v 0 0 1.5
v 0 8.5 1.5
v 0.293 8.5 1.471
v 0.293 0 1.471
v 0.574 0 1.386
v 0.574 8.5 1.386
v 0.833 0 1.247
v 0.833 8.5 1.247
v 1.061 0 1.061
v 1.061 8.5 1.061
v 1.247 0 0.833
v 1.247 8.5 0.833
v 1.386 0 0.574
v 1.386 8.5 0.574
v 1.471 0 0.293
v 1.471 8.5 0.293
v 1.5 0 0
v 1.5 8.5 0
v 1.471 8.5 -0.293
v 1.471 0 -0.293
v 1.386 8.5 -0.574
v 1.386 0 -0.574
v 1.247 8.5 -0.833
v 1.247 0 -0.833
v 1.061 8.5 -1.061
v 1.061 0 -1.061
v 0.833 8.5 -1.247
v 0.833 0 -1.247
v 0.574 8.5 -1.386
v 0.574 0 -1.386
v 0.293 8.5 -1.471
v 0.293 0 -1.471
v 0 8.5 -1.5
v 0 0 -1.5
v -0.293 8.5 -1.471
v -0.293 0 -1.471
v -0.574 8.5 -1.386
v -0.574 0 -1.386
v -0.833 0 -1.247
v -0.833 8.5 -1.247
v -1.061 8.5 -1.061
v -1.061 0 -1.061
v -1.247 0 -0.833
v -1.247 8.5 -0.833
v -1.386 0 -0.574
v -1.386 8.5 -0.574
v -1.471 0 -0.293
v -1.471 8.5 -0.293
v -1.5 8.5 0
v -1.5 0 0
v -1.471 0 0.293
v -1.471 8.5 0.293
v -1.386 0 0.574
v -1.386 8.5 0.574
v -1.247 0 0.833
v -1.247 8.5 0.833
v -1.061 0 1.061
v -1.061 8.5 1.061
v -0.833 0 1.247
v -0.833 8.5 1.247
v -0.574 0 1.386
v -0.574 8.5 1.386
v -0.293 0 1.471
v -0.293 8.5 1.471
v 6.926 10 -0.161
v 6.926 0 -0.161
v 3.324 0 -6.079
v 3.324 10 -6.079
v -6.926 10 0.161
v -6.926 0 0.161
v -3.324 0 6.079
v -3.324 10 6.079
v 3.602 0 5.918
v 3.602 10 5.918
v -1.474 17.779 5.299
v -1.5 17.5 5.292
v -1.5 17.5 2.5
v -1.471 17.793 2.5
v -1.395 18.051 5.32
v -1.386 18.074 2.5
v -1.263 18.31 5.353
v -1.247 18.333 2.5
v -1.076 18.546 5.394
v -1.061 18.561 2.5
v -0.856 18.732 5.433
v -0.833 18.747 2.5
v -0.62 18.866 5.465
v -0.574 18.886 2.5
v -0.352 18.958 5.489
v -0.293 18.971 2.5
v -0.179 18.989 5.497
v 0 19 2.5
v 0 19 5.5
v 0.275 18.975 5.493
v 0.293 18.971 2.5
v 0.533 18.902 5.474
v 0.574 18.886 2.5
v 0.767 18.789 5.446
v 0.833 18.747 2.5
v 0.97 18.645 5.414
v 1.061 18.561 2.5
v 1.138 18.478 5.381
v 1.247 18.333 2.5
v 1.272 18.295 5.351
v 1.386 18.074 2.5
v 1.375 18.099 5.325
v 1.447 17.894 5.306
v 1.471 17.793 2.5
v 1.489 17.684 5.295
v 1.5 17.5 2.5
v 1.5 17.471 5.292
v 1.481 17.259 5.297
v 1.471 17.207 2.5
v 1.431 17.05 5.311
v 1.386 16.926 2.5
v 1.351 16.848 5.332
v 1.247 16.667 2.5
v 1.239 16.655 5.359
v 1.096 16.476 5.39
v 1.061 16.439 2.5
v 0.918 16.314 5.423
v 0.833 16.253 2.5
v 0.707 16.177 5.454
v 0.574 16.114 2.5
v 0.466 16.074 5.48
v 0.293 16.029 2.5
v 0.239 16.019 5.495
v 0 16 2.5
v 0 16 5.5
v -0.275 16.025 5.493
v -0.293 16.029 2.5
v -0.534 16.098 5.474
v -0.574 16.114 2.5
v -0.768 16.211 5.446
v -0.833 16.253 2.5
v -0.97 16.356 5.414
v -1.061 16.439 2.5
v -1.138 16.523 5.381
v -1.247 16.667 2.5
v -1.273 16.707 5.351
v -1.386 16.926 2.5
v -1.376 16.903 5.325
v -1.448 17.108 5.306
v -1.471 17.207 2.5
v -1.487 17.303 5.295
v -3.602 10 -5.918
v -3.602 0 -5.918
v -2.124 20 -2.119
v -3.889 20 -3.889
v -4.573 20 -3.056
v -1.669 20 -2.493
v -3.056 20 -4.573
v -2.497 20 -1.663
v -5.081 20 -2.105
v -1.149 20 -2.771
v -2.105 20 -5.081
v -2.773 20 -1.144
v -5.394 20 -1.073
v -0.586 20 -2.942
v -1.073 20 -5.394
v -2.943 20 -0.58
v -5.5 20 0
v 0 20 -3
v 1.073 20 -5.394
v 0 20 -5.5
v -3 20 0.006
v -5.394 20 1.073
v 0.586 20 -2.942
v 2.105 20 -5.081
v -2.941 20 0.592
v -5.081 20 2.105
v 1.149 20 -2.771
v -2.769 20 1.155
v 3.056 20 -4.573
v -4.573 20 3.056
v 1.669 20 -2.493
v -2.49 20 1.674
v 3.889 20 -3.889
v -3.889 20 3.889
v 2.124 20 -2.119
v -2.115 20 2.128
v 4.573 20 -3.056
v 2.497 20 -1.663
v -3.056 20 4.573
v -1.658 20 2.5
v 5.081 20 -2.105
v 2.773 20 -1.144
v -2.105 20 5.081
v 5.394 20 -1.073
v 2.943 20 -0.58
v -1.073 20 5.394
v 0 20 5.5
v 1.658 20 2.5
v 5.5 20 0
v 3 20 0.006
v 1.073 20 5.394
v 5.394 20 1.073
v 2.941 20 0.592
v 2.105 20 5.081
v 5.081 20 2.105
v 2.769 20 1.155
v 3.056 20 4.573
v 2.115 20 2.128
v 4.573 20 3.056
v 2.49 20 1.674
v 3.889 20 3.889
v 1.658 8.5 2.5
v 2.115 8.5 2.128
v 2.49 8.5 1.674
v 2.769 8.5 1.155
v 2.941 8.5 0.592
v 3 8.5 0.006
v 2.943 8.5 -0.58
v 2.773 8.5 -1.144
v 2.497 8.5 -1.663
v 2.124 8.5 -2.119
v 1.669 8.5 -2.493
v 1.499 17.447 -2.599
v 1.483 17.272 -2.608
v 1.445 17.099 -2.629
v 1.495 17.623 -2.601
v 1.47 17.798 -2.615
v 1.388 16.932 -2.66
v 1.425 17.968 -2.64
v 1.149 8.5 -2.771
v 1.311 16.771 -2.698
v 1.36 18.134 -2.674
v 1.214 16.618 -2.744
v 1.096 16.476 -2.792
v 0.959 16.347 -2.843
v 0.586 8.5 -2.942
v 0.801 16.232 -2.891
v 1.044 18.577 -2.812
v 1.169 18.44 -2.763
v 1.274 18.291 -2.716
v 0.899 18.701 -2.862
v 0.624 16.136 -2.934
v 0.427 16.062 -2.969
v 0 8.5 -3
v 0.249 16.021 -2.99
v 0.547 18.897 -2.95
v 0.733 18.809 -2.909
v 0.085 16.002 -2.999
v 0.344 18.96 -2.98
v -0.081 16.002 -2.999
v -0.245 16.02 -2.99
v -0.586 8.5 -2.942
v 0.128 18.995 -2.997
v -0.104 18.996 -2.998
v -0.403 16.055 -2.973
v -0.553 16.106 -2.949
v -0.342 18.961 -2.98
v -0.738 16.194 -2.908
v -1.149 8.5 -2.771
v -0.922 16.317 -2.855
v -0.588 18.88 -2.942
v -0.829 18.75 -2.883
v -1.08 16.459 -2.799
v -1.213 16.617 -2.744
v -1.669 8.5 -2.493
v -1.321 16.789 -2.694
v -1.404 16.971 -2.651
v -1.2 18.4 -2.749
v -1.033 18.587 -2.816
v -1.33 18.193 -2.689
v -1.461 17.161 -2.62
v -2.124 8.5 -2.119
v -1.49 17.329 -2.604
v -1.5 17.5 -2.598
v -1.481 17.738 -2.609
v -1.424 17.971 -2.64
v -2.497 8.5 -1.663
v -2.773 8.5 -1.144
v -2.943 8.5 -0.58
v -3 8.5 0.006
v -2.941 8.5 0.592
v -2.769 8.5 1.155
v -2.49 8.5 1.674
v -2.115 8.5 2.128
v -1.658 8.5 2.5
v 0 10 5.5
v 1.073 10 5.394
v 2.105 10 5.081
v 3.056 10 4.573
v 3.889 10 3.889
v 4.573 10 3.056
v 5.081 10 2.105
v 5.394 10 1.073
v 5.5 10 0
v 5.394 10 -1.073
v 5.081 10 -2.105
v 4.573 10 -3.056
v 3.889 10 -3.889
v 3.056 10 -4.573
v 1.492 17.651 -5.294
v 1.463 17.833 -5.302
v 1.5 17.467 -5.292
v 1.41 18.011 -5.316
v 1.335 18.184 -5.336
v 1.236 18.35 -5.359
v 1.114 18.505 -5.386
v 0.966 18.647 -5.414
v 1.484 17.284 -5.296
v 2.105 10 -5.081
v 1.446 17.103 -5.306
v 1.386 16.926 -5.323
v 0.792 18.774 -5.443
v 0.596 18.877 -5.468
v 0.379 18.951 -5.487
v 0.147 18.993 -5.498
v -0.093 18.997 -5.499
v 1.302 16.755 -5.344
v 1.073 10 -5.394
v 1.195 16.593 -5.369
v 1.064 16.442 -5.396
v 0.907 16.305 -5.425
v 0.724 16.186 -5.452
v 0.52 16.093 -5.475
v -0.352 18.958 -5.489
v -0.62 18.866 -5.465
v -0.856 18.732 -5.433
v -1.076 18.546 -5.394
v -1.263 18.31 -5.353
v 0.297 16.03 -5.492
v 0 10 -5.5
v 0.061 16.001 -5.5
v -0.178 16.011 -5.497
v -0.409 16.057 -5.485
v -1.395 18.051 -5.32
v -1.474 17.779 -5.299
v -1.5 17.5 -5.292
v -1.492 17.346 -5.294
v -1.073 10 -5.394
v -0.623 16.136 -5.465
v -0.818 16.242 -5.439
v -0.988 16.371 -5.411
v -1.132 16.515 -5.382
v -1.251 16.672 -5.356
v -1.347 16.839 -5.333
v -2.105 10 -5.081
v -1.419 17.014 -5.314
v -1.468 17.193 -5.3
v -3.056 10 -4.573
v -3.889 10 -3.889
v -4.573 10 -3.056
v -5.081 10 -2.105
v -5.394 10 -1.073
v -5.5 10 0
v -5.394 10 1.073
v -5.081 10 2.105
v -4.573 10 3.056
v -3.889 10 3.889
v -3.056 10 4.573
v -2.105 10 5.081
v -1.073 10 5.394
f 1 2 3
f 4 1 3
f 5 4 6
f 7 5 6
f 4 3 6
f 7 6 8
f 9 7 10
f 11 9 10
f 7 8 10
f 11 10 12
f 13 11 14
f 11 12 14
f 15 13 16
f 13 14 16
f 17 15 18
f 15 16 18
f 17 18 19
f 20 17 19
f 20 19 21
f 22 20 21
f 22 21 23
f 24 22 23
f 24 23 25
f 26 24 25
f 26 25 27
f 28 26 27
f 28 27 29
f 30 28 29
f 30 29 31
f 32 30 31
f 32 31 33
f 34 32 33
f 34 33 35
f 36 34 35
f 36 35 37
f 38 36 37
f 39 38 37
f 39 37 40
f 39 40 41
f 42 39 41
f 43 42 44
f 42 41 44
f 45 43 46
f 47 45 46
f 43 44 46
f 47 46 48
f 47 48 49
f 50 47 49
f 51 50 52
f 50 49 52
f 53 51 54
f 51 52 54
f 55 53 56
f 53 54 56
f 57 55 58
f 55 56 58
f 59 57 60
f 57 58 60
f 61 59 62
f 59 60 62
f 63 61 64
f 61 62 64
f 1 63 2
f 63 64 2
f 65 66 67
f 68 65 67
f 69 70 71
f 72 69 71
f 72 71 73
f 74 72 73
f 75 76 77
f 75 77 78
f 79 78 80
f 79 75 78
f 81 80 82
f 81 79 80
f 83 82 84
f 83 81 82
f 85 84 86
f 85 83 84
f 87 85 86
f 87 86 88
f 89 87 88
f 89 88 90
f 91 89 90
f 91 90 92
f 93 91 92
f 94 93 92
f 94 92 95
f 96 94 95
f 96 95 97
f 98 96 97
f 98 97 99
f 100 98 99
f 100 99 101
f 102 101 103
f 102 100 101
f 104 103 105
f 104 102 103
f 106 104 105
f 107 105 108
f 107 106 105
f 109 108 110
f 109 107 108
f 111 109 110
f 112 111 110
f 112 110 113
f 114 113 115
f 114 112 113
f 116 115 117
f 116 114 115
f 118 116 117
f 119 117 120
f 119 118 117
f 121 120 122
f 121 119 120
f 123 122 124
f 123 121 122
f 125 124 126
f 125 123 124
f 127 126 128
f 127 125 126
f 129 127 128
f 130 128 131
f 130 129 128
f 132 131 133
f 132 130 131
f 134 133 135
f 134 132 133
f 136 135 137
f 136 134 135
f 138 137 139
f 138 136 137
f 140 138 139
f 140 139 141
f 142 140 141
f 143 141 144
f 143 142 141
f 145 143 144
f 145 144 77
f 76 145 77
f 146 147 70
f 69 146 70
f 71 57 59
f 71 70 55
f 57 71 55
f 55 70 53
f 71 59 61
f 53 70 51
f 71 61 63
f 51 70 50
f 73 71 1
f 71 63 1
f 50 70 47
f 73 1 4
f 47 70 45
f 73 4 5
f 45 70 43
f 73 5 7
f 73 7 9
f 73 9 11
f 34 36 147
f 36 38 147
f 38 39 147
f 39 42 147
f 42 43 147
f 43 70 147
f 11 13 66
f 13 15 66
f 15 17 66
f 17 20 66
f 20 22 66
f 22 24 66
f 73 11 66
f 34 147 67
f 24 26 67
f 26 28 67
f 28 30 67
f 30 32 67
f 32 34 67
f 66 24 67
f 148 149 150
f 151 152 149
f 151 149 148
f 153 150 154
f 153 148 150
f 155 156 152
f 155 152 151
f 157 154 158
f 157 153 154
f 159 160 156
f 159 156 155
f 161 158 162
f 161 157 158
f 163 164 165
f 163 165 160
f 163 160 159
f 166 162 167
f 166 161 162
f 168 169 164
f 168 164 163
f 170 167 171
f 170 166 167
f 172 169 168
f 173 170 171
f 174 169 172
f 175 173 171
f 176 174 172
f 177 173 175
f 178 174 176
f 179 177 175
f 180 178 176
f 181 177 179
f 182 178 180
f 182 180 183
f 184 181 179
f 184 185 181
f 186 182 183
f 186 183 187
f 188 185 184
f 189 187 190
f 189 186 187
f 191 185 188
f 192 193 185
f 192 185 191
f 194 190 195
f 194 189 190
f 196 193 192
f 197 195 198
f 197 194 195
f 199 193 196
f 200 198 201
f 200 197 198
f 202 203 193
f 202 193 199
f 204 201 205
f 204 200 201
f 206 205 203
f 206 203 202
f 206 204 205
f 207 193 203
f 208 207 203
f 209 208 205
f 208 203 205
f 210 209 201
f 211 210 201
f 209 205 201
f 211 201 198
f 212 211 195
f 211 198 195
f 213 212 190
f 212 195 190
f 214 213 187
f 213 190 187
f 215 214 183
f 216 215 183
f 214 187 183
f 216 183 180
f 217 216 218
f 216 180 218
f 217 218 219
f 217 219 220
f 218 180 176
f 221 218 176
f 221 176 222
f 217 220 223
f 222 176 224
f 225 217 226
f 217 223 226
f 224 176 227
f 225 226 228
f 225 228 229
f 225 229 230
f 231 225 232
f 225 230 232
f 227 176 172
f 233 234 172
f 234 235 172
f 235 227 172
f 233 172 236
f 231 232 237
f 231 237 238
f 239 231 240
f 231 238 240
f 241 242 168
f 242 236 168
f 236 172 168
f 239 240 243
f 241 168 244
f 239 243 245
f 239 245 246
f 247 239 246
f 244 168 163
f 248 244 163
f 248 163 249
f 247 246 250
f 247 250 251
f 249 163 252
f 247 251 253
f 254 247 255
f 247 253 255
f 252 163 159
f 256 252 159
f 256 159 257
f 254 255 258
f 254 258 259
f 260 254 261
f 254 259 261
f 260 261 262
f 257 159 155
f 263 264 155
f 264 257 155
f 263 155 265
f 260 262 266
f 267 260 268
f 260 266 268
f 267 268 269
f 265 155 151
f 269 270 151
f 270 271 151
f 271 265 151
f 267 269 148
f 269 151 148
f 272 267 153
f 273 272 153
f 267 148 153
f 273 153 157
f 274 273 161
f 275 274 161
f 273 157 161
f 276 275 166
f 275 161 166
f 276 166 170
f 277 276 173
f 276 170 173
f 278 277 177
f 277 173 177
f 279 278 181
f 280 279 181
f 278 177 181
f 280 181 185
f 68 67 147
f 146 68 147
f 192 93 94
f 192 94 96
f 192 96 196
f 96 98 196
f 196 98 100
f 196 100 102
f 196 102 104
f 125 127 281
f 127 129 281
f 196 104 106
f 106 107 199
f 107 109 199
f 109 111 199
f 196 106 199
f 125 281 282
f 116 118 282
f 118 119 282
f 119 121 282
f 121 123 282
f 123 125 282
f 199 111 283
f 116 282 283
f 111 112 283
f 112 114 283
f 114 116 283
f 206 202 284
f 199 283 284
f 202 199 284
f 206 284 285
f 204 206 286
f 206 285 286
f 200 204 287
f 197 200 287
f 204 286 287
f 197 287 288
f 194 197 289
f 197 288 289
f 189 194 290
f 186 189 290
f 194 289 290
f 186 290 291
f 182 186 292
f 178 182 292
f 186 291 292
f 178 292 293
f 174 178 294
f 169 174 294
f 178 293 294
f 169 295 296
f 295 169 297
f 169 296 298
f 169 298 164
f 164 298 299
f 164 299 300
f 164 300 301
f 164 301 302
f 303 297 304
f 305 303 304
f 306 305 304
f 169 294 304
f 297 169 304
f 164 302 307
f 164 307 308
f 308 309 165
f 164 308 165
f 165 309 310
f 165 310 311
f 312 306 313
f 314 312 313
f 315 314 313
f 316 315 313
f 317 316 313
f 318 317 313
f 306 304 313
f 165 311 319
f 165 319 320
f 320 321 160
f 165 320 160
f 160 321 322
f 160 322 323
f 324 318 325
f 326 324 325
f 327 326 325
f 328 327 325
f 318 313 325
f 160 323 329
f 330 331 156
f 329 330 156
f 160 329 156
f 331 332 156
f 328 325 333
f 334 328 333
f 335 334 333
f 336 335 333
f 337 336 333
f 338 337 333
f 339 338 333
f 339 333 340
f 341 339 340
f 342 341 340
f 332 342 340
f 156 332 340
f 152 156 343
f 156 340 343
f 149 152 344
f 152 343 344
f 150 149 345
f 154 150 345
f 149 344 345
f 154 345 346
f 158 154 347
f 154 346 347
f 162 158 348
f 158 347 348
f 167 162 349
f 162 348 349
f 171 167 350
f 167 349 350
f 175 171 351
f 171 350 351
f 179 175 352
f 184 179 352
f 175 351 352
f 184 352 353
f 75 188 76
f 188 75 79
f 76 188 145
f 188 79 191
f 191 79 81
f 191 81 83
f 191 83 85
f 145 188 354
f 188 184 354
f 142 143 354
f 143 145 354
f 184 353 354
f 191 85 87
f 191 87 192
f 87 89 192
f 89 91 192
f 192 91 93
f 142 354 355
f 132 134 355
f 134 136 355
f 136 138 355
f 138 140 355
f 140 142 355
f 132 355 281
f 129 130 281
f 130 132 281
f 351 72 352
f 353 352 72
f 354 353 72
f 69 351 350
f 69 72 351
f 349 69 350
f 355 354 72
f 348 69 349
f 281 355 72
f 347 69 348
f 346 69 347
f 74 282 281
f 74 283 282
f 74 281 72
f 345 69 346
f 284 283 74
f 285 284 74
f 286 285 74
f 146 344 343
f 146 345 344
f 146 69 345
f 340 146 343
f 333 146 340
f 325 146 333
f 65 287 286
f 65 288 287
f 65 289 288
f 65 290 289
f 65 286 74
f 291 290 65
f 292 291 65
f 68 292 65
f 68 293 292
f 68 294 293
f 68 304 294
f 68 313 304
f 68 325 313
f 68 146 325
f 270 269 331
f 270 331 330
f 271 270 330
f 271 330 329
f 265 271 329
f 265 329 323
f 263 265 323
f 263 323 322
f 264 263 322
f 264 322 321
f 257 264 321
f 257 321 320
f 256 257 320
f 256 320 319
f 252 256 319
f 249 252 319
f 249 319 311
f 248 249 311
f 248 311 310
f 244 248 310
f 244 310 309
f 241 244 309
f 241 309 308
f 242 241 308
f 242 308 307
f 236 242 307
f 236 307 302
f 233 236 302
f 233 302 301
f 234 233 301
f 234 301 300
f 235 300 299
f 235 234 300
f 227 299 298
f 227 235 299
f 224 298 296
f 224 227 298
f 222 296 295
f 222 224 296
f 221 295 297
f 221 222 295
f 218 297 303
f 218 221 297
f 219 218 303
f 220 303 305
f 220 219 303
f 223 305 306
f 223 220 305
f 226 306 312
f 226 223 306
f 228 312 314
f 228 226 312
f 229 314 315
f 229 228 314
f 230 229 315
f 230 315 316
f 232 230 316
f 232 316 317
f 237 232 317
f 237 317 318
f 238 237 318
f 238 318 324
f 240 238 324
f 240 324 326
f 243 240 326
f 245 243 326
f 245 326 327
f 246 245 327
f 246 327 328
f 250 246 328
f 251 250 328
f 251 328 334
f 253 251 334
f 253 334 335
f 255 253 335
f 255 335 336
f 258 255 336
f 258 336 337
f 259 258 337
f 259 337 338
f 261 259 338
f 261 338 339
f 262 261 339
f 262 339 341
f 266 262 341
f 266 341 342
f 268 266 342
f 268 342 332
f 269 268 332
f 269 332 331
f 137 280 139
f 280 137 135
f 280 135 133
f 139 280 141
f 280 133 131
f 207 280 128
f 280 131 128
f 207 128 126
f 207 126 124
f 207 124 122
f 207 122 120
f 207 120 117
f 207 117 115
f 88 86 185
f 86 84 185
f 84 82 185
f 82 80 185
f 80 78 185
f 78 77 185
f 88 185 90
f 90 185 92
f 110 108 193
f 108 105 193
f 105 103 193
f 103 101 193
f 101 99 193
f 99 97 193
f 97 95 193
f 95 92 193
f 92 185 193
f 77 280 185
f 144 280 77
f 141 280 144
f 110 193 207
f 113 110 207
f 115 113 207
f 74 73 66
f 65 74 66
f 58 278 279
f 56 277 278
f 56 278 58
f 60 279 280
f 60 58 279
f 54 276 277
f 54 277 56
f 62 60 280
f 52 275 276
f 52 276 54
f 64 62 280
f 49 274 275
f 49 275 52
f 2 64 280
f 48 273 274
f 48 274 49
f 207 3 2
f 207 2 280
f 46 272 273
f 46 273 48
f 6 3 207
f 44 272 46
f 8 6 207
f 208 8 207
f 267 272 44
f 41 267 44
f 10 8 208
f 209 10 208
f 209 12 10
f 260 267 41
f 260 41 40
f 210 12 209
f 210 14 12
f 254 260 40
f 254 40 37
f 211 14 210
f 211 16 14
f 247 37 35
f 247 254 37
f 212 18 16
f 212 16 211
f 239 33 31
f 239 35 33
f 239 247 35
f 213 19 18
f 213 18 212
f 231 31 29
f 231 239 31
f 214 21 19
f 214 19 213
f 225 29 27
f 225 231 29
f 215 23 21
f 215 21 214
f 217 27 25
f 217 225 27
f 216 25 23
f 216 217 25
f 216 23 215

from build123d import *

# Parameters (mm, degrees)
EXTRUDE_1_DEPTH          = 10
SKETCH_2_R               = 5.5
EXTRUDE_2_DEPTH          = 10
CUT_EXTRUDE_1_DEPTH      = 11.5
CUT_EXTRUDE_3_DEPTH      = 23.837874147
CUT_EXTRUDE_3_DEPTH_BACK = 23.837874147
SKETCH_4_R               = 1.5
SKETCH_6_R               = 1.5
CUT_EXTRUDE_4_DEPTH      = 15.736856398


with BuildPart() as part:
    # 草图1 → 凸台-拉伸1 (new body)
    with BuildSketch(Plane(origin=(0, 0, 0), x_dir=(1, 0, 0), z_dir=(0, 1, 0))):
        Polygon((3.602298117, -5.918061192), (6.926340392, 0.160651085), (3.324042275, 6.078712278), (-3.602298117, 5.918061192), (-6.926340392, -0.160651085), (-3.324042275, -6.078712278), align=None)
    extrude(amount=EXTRUDE_1_DEPTH)

    # 草图2 → 凸台-拉伸2 (add)
    with BuildSketch(Plane(origin=(0, 10, 0), x_dir=(1, 0, 0), z_dir=(0, 1, 0))):
        with Locations(Location((0, 0, 0), (0, 0, 270))):
            Circle(SKETCH_2_R)
    extrude(amount=EXTRUDE_2_DEPTH)

    # 草图3 → 切除-拉伸1 (cut)
    with BuildSketch(Plane(origin=(0, 20, 0), x_dir=(1, 0, 0), z_dir=(0, 1, 0))):
        with BuildLine():
            Line((-1.658312395, -2.5), (1.658312395, -2.5))
            ThreePointArc((1.658312395, -2.5), (0, 3), (-1.658312395, -2.5))
        make_face()
    extrude(amount=-CUT_EXTRUDE_1_DEPTH, mode=Mode.SUBTRACT)

    # 草图4 → 切除-拉伸3 (cut, two sides: drawn at the far end of the back side and taken through both)
    with BuildSketch(Plane(origin=(0, 0, 2.5), x_dir=(-1, 0, 0), z_dir=(0, 0, -1)).offset(-CUT_EXTRUDE_3_DEPTH_BACK)):
        with Locations((0, 17.5)):
            Circle(SKETCH_4_R)
    extrude(amount=CUT_EXTRUDE_3_DEPTH + CUT_EXTRUDE_3_DEPTH_BACK, mode=Mode.SUBTRACT)

    # 草图6 → 切除-拉伸4 (cut, through all)
    with BuildSketch(Plane(origin=(0, 8.5, 0), x_dir=(1, 0, 0), z_dir=(0, 1, 0))):
        with Locations(Location((0, 0, 0), (0, 0, 270))):
            Circle(SKETCH_6_R)
    extrude(amount=-CUT_EXTRUDE_4_DEPTH, mode=Mode.SUBTRACT)


solid = part.part
